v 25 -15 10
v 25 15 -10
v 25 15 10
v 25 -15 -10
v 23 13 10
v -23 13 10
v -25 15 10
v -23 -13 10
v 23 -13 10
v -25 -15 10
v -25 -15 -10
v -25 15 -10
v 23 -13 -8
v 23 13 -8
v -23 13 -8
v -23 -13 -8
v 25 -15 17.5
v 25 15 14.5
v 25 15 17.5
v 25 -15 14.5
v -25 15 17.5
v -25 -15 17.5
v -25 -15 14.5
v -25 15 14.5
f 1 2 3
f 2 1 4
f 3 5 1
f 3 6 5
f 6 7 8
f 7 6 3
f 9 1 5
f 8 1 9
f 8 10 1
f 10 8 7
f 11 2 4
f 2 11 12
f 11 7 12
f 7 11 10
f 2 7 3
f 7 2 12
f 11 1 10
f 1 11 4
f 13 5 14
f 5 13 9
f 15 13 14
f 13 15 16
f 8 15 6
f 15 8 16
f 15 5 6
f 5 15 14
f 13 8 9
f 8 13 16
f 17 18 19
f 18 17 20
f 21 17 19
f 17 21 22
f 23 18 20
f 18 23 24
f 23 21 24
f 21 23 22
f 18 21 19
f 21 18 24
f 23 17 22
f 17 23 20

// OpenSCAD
// Parametric box — OpenSCAD Viewer demo model.
// Drag the sliders in Parameters and watch the viewport update.

/* [Box dimensions] */
// Outer width in mm
box_width = 50;    // [10:5:200]
// Outer depth in mm
box_depth = 30;    // [10:5:200]
// Outer height in mm
box_height = 20;   // [5:5:100]

/* [Lid] */
// How the lid attaches
lid_style = "snap";   // [snap, screw, hinge]
// Render the lid at all
show_lid = true;

/* [Hidden] */
wall = 2;
eps = 0.01;

module shell(w, d, h) {
    difference() {
        cube([w, d, h], center = true);
        translate([0, 0, wall])
            cube([w - 2*wall, d - 2*wall, h], center = true);
    }
}

shell(box_width, box_depth, box_height);
if (show_lid) translate([0, 0, box_height/2 + 6])
    cube([box_width, box_depth, 3], center = true);
